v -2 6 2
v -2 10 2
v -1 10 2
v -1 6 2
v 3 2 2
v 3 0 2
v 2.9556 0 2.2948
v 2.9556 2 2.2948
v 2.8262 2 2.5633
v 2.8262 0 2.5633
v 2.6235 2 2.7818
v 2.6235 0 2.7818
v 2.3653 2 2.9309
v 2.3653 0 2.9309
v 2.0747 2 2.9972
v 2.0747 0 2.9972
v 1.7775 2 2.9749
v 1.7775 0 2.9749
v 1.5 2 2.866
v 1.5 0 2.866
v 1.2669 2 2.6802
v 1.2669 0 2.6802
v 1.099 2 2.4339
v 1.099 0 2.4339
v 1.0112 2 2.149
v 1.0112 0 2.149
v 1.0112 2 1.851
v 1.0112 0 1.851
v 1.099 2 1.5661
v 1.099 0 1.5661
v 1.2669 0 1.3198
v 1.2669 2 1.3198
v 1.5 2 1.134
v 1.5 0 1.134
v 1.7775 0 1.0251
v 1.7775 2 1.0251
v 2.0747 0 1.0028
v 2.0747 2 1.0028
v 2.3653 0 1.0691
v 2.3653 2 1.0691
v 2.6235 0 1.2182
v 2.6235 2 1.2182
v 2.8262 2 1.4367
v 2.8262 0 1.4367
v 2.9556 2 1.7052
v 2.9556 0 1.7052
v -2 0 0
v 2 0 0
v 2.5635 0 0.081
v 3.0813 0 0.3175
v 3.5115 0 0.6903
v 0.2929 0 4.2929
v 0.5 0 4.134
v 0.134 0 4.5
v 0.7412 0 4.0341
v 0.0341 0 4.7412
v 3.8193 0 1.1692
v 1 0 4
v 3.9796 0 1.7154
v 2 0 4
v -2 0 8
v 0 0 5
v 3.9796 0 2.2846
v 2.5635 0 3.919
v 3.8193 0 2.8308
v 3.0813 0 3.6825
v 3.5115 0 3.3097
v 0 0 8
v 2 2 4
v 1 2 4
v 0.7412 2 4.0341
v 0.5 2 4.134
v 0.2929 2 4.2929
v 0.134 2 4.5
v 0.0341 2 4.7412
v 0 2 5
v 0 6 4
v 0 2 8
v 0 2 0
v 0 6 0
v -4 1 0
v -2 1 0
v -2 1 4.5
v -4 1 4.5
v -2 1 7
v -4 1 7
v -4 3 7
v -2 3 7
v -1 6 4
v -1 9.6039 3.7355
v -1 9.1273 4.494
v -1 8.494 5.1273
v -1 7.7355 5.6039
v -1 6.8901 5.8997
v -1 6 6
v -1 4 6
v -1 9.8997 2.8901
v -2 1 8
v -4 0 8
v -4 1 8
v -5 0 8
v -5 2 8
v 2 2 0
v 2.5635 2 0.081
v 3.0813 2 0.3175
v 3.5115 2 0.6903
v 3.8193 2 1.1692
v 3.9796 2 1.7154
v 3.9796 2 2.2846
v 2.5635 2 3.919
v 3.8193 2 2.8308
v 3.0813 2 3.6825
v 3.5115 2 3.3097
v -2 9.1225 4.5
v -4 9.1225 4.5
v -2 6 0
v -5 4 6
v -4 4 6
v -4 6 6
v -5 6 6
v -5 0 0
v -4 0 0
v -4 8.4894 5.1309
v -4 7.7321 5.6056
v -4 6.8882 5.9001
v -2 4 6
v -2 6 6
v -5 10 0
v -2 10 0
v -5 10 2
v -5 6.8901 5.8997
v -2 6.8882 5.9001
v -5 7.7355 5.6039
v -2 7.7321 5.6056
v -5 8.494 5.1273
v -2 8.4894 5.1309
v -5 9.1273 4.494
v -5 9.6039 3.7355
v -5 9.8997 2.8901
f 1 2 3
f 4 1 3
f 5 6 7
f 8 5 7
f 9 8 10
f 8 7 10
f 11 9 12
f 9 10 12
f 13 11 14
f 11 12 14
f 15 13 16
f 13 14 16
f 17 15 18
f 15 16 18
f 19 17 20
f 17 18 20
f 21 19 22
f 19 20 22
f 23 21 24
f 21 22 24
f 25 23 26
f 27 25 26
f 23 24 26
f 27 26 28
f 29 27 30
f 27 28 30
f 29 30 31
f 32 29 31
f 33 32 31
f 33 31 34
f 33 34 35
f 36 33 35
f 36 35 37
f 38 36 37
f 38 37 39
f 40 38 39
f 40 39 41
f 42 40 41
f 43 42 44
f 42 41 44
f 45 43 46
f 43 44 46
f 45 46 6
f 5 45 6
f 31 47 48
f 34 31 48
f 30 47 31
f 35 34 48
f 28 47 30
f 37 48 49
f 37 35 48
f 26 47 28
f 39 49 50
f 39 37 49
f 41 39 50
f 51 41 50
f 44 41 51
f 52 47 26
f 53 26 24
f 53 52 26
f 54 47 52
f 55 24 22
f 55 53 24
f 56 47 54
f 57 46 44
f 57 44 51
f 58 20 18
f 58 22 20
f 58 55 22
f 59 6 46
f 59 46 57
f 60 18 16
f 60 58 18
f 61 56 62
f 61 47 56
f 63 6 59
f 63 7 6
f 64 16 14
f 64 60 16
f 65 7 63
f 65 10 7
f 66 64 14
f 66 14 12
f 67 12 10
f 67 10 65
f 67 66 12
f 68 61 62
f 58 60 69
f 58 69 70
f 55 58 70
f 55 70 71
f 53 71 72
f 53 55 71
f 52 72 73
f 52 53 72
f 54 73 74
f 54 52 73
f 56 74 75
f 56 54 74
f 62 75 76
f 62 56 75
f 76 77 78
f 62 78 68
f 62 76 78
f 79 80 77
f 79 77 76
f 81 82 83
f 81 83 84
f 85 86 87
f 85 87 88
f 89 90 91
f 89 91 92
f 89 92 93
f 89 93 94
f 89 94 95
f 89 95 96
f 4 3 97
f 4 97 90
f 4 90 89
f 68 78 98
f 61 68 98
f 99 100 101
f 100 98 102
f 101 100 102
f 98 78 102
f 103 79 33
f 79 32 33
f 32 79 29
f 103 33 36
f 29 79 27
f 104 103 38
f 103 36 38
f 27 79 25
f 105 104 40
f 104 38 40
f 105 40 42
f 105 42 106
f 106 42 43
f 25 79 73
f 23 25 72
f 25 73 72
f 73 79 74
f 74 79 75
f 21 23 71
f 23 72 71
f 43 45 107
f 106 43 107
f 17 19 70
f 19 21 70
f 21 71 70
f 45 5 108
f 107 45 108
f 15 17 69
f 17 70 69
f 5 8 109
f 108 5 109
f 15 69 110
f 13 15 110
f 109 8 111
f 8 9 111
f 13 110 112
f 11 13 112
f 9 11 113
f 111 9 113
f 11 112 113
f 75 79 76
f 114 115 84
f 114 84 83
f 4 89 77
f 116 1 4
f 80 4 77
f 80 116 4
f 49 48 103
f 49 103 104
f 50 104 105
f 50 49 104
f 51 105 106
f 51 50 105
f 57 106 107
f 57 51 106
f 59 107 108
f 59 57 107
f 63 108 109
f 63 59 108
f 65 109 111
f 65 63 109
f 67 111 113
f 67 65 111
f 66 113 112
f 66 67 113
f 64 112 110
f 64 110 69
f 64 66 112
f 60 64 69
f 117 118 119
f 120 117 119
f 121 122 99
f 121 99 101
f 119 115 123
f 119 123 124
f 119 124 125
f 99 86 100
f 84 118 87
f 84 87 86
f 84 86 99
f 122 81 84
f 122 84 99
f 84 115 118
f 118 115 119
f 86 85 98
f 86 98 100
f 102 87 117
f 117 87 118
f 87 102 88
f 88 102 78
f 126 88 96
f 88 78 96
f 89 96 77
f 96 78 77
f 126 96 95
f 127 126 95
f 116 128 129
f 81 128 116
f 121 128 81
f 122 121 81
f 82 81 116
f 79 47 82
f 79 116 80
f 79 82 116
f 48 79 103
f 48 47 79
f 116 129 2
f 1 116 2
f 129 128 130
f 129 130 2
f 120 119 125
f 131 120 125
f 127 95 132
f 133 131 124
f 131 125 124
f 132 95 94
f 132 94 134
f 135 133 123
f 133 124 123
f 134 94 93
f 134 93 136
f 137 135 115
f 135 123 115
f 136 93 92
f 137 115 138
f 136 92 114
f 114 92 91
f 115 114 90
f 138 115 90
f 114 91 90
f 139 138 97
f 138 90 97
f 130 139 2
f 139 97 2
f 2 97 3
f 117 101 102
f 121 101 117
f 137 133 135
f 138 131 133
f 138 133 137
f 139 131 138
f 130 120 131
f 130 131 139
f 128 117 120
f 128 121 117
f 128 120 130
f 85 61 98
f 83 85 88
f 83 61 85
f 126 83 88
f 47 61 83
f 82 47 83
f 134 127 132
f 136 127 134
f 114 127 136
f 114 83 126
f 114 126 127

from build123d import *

# Parameters (mm, degrees)
BOSS_EXTRUDE2_DEPTH = 8
SKETCH2_R           = 1
BOSS_EXTRUDE3_DEPTH = 2
CUT_EXTRUDE1_DEPTH  = 4
CUT_EXTRUDE2_DEPTH  = 5
CUT_EXTRUDE3_DEPTH  = 1
SKETCH6_W           = 2
SKETCH6_H           = 2.5
CUT_EXTRUDE4_DEPTH  = 10


with BuildPart() as part:
    # Sketch1 → Boss-Extrude2 (new body)
    with BuildSketch(Plane.XY):
        Polygon((0, 0), (-2, 0), (-2, 1), (-4, 1), (-4, 0), (-5, 0), (-5, 10), (-1, 10), (-1, 6), (0, 6), align=None)
    extrude(amount=BOSS_EXTRUDE2_DEPTH)

    # Sketch2 → Boss-Extrude3 (add)
    with BuildSketch(Plane.XZ):
        with BuildLine():
            Line((0, 0), (2, 0))
            ThreePointArc((2, 0), (4, 2), (2, 4))
            Line((2, 4), (1, 4))
            ThreePointArc((1, 4), (0.292893219, 4.292893219), (0, 5))
            Line((0, 5), (0, 0))
        make_face()
        with Locations((2, 2)):
            Circle(SKETCH2_R, mode=Mode.SUBTRACT)
    extrude(amount=-BOSS_EXTRUDE3_DEPTH)

    # Sketch3 → Cut-Extrude1 (cut)
    with BuildSketch(Plane(origin=(0, 10, 0), x_dir=(1, 0, 0), z_dir=(0, 1, 0))):
        Polygon((-2, 0), (-2, -2), (-1, -2), (-1, -8), (0, -8), (0, 0), align=None)
    extrude(amount=-CUT_EXTRUDE1_DEPTH, mode=Mode.SUBTRACT)

    # Sketch4 → Cut-Extrude2 (cut, symmetric)
    with BuildSketch(Plane(origin=(-1, 0, 0), x_dir=(0, 0, -1), z_dir=(1, 0, 0))):
        with BuildLine():
            Line((-2, 10), (-8, 10))
            Line((-8, 10), (-8, 2))
            Line((-8, 2), (-6, 4))
            Line((-6, 4), (-6, 6))
            ThreePointArc((-6, 6), (-4.828427125, 8.828427125), (-2, 10))
        make_face()
    extrude(amount=CUT_EXTRUDE2_DEPTH, both=True, mode=Mode.SUBTRACT)

    # Sketch5 → Cut-Extrude3 (cut)
    with BuildSketch(Plane(origin=(0, 0, 0), x_dir=(0, 0, -1), z_dir=(1, 0, 0))):
        Polygon((-4, 6), (-6, 4), (-6, 6), align=None)
    extrude(amount=-CUT_EXTRUDE3_DEPTH, mode=Mode.SUBTRACT)

    # Sketch6 → Cut-Extrude4 (cut, through all)
    with BuildSketch(Plane.XZ.offset(-1)):
        with Locations((-3, 5.75)):
            Rectangle(SKETCH6_W, SKETCH6_H)
    extrude(amount=-CUT_EXTRUDE4_DEPTH, mode=Mode.SUBTRACT)


solid = part.part
